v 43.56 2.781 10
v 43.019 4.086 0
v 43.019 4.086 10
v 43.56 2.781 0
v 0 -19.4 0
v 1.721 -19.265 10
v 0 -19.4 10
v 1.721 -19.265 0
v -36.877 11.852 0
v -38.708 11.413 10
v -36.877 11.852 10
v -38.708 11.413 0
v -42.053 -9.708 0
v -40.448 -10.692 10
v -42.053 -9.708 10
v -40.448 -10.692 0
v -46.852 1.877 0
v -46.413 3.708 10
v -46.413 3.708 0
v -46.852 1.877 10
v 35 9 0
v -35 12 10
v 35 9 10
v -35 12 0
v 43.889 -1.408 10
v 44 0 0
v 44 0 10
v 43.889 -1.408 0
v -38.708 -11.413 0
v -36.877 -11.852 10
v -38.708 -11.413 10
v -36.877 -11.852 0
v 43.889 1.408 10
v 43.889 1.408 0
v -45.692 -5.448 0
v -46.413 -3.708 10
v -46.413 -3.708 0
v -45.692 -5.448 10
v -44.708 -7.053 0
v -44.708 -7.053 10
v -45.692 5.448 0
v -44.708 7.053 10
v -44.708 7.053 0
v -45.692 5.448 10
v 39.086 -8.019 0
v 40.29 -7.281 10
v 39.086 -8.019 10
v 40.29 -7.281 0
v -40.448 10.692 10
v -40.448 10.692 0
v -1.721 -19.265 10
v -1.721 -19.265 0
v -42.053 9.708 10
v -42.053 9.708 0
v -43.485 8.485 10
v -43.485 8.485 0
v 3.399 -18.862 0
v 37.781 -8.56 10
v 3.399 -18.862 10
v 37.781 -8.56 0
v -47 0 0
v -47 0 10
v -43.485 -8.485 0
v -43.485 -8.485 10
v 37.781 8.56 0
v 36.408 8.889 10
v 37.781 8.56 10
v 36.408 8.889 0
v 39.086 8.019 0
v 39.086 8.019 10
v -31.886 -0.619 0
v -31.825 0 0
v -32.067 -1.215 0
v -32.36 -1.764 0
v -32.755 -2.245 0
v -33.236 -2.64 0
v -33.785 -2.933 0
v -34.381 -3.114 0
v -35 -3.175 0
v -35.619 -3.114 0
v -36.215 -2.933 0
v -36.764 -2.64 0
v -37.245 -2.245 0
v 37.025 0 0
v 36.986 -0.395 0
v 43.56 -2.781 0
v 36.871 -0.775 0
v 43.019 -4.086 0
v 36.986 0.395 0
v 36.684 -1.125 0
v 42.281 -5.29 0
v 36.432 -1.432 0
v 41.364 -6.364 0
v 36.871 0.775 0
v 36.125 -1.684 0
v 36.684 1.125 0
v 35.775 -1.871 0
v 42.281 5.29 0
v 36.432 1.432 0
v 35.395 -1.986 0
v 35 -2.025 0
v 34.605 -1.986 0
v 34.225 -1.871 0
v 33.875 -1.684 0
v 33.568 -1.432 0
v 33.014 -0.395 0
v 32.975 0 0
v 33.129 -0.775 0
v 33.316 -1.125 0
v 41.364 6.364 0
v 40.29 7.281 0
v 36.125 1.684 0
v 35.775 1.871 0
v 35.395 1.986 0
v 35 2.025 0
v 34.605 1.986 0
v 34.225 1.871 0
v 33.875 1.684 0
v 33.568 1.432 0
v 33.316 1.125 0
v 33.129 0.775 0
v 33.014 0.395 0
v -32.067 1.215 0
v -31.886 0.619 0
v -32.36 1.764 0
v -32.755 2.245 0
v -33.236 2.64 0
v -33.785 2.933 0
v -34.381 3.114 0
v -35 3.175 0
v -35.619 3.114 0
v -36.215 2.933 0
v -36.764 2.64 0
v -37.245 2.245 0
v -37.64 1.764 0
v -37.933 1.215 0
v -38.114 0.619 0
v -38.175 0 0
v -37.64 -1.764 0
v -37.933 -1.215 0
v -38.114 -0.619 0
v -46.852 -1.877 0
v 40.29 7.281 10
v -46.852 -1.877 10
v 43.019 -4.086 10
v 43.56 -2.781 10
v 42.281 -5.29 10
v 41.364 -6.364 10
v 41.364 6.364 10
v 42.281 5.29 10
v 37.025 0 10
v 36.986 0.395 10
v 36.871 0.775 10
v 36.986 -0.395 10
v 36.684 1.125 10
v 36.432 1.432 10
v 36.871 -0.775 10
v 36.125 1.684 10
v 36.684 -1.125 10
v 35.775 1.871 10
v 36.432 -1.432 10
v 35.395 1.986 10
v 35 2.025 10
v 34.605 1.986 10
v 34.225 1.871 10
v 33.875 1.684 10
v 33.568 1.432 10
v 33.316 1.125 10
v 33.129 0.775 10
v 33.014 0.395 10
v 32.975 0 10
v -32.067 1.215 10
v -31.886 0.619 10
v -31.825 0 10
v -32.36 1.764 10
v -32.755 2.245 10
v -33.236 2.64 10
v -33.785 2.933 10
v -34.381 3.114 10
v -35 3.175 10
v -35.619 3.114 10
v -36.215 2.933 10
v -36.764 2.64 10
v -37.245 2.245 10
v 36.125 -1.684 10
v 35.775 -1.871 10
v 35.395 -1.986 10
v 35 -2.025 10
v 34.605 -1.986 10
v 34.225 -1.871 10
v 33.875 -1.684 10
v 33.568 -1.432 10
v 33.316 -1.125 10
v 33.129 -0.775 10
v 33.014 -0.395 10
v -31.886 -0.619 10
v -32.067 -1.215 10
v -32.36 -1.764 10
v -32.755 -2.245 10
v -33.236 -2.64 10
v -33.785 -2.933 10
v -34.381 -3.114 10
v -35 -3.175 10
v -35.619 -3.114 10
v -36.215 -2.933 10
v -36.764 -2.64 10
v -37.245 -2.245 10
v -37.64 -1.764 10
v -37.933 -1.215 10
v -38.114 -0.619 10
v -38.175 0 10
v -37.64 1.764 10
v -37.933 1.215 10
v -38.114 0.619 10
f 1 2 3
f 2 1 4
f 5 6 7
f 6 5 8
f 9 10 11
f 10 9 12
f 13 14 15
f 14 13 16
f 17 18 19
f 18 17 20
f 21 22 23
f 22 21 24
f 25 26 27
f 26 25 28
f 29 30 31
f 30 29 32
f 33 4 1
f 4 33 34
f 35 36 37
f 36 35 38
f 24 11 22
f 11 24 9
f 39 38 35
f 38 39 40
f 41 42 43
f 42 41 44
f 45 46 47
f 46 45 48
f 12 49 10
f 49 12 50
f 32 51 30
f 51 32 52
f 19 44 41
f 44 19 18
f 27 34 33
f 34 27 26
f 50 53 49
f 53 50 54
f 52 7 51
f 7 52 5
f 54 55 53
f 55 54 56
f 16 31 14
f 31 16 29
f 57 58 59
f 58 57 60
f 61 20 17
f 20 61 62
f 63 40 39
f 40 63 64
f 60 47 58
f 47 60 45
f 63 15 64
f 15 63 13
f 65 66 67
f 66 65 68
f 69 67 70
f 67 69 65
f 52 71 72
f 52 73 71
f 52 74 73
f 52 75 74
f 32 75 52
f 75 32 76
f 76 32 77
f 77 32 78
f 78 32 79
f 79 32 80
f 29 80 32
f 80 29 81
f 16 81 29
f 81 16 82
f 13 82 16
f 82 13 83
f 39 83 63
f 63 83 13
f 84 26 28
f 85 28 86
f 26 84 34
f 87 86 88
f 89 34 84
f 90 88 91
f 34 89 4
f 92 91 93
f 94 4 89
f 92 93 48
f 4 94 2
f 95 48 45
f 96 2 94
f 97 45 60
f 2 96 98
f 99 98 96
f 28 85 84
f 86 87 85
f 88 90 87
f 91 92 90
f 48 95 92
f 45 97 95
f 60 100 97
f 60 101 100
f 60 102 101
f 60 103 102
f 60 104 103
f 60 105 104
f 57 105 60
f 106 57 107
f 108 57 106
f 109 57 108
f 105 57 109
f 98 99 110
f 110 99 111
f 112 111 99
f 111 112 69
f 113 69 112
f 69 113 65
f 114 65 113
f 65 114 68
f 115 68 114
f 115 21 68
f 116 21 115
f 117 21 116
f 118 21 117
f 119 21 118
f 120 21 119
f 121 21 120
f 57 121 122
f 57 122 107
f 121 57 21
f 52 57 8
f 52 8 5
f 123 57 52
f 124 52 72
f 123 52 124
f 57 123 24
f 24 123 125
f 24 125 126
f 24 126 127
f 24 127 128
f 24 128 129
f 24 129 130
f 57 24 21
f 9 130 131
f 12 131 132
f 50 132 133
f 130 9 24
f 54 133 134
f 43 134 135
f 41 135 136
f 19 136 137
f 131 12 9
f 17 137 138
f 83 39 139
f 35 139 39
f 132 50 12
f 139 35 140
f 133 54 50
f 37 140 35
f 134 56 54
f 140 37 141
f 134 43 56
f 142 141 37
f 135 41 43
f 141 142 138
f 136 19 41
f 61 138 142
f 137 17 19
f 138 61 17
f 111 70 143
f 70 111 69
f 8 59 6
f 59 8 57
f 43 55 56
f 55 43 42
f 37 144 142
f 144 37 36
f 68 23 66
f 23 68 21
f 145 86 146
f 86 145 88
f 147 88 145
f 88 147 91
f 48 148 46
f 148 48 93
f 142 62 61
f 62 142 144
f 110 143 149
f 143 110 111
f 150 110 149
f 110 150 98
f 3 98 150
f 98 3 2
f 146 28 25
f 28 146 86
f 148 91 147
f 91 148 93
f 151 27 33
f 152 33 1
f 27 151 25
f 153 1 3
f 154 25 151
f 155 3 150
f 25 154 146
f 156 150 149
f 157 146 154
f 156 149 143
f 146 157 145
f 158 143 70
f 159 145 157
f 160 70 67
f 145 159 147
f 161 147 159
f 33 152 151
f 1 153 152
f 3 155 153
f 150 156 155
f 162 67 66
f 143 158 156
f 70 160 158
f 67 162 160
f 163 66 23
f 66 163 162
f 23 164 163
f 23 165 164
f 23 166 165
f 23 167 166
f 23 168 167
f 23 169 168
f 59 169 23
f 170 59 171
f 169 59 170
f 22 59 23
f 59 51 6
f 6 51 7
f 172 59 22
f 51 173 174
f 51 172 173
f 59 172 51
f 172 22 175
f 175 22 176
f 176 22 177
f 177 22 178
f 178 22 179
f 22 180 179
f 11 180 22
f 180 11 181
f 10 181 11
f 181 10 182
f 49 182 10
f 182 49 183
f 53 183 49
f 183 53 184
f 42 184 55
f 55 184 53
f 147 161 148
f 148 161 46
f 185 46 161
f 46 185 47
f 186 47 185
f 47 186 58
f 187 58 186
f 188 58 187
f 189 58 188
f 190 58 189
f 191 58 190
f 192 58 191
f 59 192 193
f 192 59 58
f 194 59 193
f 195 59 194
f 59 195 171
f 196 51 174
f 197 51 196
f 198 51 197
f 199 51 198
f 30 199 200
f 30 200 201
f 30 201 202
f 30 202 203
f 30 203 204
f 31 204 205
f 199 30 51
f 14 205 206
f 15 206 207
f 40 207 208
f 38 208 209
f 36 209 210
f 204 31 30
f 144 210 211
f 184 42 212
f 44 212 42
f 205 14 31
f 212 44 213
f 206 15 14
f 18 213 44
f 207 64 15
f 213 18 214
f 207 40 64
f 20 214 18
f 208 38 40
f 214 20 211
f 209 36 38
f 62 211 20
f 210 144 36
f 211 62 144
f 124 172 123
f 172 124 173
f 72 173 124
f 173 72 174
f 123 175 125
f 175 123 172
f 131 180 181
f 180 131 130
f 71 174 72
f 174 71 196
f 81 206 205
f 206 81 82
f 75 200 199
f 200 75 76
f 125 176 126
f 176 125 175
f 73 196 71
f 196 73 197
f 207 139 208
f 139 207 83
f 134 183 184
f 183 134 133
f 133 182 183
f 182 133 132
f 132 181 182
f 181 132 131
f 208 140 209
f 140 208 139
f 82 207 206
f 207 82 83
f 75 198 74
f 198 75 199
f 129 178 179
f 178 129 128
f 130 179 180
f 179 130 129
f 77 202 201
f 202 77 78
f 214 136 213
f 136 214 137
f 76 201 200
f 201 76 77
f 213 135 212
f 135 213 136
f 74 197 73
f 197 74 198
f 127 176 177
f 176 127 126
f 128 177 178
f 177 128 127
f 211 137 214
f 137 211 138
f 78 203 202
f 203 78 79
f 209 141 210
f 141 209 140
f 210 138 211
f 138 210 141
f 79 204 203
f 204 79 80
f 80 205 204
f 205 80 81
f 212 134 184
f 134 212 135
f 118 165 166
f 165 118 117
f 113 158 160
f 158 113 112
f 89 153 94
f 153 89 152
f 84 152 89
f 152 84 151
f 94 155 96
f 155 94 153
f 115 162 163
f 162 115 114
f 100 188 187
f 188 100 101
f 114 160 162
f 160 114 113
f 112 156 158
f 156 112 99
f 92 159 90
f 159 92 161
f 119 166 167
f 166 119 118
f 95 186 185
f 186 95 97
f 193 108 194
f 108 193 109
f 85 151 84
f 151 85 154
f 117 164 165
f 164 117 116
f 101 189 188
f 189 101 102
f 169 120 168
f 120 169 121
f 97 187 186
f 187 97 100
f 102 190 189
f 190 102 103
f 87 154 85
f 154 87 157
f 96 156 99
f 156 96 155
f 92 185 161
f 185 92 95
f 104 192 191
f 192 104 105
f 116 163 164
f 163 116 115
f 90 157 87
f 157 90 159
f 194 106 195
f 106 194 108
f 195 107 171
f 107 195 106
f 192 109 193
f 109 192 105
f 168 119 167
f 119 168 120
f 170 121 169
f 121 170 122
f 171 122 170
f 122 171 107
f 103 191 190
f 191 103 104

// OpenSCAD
$fn = 32;

// ----------------------------------------------------------------------
// Lever: 70 mm between the bosses, 10 mm thick, smooth outline
// ----------------------------------------------------------------------

// --- parameters (mm) ---
lever_l = 70;             // distance between the boss centres
boss_a = 24;              // first boss diameter
boss_b = 18;              // second boss diameter
bore_a = 6.35;            // first bore
bore_b = 4.05;            // second bore
lever_t = 10;             // lever thickness
boss_c = 22;              // middle boss diameter
bend = 8.4;               // how far the middle boss drops

lever_profile = [[-47, 0], [-46.852, -1.877], [-46.413, -3.708], [-45.692, -5.448], [-44.708, -7.053], [-43.485, -8.485], [-42.053, -9.708], [-40.448, -10.692], [-38.708, -11.413], [-36.877, -11.852], [-1.721, -19.265], [0, -19.4], [1.721, -19.265], [3.399, -18.862], [37.781, -8.56], [39.086, -8.019], [40.29, -7.281], [41.364, -6.364], [42.281, -5.29], [43.019, -4.086], [43.56, -2.781], [43.889, -1.408], [44, 0], [43.889, 1.408], [43.56, 2.781], [43.019, 4.086], [42.281, 5.29], [41.364, 6.364], [40.29, 7.281], [39.086, 8.019], [37.781, 8.56], [36.408, 8.889], [35, 9], [-35, 12], [-36.877, 11.852], [-38.708, 11.413], [-40.448, 10.692], [-42.053, 9.708], [-43.485, 8.485], [-44.708, 7.053], [-45.692, 5.448], [-46.413, 3.708], [-46.852, 1.877]];

difference() {
  linear_extrude(height = lever_t) polygon(lever_profile);
  translate([-35, 0, -2.5]) cylinder(h = lever_t + 5, d = bore_a);
  translate([35, 0, -2.5]) cylinder(h = lever_t + 5, d = bore_b);
}
